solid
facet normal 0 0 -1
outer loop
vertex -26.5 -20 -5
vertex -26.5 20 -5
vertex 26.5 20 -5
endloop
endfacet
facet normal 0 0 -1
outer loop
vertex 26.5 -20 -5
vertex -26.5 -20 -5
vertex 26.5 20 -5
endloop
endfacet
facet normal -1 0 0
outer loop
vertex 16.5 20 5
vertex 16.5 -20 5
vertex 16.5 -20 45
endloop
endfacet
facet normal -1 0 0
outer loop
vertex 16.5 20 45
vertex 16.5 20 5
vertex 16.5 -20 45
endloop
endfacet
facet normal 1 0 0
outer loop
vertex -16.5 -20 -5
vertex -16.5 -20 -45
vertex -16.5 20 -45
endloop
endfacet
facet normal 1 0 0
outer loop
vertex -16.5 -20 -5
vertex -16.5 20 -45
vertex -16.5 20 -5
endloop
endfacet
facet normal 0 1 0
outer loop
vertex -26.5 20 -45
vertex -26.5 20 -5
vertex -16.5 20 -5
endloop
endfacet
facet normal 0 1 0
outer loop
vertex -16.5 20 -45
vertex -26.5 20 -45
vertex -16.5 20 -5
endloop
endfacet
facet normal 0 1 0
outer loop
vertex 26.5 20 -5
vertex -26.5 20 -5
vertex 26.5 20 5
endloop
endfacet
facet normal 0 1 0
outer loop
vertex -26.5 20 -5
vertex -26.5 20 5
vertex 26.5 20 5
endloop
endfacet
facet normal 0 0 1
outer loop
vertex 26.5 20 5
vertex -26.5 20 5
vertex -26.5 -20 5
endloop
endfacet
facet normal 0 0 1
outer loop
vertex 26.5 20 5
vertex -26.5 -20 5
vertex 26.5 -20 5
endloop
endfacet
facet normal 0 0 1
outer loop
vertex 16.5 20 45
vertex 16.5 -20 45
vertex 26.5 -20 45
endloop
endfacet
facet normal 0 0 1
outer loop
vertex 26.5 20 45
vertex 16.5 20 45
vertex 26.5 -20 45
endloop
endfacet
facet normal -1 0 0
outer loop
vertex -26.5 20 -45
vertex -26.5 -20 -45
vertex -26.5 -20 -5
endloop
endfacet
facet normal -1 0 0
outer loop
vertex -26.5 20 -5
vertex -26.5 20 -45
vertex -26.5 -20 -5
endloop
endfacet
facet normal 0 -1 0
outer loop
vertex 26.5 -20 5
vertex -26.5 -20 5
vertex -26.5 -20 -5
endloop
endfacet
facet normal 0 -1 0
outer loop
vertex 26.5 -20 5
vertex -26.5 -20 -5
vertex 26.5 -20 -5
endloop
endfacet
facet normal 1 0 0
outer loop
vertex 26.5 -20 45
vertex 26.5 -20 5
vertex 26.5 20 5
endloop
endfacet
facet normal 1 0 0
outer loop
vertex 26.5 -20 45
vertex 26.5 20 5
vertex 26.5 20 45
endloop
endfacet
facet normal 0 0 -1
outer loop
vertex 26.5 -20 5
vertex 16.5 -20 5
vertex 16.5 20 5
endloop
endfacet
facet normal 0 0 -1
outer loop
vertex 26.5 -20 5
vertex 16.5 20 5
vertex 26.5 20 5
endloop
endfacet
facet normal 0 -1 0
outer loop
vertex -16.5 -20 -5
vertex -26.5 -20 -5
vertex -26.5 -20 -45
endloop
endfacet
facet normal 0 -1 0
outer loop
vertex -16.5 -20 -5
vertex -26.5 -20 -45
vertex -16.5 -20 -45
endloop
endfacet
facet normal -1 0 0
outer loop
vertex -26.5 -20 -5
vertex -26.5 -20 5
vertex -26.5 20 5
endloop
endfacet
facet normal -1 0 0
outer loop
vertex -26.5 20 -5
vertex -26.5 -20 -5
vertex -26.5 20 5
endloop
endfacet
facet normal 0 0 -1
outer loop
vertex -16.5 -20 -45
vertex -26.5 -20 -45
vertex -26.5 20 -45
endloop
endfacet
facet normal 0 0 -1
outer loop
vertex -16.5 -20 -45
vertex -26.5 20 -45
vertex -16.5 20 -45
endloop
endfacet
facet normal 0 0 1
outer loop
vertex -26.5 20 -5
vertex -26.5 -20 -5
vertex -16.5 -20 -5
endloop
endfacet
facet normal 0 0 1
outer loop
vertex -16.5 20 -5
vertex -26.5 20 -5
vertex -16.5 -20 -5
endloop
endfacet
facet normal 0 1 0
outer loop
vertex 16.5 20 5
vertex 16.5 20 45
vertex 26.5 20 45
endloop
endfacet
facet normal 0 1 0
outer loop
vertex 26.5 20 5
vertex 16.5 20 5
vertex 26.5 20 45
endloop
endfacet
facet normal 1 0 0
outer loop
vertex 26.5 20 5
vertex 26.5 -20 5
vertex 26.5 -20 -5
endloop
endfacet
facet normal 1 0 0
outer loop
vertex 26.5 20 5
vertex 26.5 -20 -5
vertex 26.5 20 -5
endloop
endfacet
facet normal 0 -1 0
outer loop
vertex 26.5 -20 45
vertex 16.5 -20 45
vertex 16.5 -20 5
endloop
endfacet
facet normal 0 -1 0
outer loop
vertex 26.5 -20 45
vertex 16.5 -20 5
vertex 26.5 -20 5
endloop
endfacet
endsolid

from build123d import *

# Parameters (mm, degrees)
SKETCH_1_W        = 53
SKETCH_1_H        = 40
EXTRUDE_1_DEPTH   = 5
SKETCH_2_W        = 10
SKETCH_2_H        = 40
EXTRUDE_2_DEPTH   = 40
EXTRUDE_2_2_DEPTH = 40


with BuildPart() as part:
    # 草图1 → 凸台-拉伸1 (new, symmetric)
    with BuildSketch(Plane.XY):
        Rectangle(SKETCH_1_W, SKETCH_1_H)
    extrude(amount=EXTRUDE_1_DEPTH, both=True)


with BuildPart() as body_2:
    # 草图2 → 凸台-拉伸2 (new, through all)
    with BuildSketch(Plane.XZ.offset(20)):
        with Locations((-21.5, -25)):
            Rectangle(SKETCH_2_W, SKETCH_2_H)
    extrude(amount=-EXTRUDE_2_DEPTH)


with BuildPart() as body_3:
    # 草图2 → Extrude 2 2 (new, through all)
    with BuildSketch(Plane.XZ.offset(20)):
        with Locations((21.5, 25)):
            Rectangle(SKETCH_2_W, SKETCH_2_H)
    extrude(amount=-EXTRUDE_2_2_DEPTH)


solid = Compound([part.part, body_2.part, body_3.part])
